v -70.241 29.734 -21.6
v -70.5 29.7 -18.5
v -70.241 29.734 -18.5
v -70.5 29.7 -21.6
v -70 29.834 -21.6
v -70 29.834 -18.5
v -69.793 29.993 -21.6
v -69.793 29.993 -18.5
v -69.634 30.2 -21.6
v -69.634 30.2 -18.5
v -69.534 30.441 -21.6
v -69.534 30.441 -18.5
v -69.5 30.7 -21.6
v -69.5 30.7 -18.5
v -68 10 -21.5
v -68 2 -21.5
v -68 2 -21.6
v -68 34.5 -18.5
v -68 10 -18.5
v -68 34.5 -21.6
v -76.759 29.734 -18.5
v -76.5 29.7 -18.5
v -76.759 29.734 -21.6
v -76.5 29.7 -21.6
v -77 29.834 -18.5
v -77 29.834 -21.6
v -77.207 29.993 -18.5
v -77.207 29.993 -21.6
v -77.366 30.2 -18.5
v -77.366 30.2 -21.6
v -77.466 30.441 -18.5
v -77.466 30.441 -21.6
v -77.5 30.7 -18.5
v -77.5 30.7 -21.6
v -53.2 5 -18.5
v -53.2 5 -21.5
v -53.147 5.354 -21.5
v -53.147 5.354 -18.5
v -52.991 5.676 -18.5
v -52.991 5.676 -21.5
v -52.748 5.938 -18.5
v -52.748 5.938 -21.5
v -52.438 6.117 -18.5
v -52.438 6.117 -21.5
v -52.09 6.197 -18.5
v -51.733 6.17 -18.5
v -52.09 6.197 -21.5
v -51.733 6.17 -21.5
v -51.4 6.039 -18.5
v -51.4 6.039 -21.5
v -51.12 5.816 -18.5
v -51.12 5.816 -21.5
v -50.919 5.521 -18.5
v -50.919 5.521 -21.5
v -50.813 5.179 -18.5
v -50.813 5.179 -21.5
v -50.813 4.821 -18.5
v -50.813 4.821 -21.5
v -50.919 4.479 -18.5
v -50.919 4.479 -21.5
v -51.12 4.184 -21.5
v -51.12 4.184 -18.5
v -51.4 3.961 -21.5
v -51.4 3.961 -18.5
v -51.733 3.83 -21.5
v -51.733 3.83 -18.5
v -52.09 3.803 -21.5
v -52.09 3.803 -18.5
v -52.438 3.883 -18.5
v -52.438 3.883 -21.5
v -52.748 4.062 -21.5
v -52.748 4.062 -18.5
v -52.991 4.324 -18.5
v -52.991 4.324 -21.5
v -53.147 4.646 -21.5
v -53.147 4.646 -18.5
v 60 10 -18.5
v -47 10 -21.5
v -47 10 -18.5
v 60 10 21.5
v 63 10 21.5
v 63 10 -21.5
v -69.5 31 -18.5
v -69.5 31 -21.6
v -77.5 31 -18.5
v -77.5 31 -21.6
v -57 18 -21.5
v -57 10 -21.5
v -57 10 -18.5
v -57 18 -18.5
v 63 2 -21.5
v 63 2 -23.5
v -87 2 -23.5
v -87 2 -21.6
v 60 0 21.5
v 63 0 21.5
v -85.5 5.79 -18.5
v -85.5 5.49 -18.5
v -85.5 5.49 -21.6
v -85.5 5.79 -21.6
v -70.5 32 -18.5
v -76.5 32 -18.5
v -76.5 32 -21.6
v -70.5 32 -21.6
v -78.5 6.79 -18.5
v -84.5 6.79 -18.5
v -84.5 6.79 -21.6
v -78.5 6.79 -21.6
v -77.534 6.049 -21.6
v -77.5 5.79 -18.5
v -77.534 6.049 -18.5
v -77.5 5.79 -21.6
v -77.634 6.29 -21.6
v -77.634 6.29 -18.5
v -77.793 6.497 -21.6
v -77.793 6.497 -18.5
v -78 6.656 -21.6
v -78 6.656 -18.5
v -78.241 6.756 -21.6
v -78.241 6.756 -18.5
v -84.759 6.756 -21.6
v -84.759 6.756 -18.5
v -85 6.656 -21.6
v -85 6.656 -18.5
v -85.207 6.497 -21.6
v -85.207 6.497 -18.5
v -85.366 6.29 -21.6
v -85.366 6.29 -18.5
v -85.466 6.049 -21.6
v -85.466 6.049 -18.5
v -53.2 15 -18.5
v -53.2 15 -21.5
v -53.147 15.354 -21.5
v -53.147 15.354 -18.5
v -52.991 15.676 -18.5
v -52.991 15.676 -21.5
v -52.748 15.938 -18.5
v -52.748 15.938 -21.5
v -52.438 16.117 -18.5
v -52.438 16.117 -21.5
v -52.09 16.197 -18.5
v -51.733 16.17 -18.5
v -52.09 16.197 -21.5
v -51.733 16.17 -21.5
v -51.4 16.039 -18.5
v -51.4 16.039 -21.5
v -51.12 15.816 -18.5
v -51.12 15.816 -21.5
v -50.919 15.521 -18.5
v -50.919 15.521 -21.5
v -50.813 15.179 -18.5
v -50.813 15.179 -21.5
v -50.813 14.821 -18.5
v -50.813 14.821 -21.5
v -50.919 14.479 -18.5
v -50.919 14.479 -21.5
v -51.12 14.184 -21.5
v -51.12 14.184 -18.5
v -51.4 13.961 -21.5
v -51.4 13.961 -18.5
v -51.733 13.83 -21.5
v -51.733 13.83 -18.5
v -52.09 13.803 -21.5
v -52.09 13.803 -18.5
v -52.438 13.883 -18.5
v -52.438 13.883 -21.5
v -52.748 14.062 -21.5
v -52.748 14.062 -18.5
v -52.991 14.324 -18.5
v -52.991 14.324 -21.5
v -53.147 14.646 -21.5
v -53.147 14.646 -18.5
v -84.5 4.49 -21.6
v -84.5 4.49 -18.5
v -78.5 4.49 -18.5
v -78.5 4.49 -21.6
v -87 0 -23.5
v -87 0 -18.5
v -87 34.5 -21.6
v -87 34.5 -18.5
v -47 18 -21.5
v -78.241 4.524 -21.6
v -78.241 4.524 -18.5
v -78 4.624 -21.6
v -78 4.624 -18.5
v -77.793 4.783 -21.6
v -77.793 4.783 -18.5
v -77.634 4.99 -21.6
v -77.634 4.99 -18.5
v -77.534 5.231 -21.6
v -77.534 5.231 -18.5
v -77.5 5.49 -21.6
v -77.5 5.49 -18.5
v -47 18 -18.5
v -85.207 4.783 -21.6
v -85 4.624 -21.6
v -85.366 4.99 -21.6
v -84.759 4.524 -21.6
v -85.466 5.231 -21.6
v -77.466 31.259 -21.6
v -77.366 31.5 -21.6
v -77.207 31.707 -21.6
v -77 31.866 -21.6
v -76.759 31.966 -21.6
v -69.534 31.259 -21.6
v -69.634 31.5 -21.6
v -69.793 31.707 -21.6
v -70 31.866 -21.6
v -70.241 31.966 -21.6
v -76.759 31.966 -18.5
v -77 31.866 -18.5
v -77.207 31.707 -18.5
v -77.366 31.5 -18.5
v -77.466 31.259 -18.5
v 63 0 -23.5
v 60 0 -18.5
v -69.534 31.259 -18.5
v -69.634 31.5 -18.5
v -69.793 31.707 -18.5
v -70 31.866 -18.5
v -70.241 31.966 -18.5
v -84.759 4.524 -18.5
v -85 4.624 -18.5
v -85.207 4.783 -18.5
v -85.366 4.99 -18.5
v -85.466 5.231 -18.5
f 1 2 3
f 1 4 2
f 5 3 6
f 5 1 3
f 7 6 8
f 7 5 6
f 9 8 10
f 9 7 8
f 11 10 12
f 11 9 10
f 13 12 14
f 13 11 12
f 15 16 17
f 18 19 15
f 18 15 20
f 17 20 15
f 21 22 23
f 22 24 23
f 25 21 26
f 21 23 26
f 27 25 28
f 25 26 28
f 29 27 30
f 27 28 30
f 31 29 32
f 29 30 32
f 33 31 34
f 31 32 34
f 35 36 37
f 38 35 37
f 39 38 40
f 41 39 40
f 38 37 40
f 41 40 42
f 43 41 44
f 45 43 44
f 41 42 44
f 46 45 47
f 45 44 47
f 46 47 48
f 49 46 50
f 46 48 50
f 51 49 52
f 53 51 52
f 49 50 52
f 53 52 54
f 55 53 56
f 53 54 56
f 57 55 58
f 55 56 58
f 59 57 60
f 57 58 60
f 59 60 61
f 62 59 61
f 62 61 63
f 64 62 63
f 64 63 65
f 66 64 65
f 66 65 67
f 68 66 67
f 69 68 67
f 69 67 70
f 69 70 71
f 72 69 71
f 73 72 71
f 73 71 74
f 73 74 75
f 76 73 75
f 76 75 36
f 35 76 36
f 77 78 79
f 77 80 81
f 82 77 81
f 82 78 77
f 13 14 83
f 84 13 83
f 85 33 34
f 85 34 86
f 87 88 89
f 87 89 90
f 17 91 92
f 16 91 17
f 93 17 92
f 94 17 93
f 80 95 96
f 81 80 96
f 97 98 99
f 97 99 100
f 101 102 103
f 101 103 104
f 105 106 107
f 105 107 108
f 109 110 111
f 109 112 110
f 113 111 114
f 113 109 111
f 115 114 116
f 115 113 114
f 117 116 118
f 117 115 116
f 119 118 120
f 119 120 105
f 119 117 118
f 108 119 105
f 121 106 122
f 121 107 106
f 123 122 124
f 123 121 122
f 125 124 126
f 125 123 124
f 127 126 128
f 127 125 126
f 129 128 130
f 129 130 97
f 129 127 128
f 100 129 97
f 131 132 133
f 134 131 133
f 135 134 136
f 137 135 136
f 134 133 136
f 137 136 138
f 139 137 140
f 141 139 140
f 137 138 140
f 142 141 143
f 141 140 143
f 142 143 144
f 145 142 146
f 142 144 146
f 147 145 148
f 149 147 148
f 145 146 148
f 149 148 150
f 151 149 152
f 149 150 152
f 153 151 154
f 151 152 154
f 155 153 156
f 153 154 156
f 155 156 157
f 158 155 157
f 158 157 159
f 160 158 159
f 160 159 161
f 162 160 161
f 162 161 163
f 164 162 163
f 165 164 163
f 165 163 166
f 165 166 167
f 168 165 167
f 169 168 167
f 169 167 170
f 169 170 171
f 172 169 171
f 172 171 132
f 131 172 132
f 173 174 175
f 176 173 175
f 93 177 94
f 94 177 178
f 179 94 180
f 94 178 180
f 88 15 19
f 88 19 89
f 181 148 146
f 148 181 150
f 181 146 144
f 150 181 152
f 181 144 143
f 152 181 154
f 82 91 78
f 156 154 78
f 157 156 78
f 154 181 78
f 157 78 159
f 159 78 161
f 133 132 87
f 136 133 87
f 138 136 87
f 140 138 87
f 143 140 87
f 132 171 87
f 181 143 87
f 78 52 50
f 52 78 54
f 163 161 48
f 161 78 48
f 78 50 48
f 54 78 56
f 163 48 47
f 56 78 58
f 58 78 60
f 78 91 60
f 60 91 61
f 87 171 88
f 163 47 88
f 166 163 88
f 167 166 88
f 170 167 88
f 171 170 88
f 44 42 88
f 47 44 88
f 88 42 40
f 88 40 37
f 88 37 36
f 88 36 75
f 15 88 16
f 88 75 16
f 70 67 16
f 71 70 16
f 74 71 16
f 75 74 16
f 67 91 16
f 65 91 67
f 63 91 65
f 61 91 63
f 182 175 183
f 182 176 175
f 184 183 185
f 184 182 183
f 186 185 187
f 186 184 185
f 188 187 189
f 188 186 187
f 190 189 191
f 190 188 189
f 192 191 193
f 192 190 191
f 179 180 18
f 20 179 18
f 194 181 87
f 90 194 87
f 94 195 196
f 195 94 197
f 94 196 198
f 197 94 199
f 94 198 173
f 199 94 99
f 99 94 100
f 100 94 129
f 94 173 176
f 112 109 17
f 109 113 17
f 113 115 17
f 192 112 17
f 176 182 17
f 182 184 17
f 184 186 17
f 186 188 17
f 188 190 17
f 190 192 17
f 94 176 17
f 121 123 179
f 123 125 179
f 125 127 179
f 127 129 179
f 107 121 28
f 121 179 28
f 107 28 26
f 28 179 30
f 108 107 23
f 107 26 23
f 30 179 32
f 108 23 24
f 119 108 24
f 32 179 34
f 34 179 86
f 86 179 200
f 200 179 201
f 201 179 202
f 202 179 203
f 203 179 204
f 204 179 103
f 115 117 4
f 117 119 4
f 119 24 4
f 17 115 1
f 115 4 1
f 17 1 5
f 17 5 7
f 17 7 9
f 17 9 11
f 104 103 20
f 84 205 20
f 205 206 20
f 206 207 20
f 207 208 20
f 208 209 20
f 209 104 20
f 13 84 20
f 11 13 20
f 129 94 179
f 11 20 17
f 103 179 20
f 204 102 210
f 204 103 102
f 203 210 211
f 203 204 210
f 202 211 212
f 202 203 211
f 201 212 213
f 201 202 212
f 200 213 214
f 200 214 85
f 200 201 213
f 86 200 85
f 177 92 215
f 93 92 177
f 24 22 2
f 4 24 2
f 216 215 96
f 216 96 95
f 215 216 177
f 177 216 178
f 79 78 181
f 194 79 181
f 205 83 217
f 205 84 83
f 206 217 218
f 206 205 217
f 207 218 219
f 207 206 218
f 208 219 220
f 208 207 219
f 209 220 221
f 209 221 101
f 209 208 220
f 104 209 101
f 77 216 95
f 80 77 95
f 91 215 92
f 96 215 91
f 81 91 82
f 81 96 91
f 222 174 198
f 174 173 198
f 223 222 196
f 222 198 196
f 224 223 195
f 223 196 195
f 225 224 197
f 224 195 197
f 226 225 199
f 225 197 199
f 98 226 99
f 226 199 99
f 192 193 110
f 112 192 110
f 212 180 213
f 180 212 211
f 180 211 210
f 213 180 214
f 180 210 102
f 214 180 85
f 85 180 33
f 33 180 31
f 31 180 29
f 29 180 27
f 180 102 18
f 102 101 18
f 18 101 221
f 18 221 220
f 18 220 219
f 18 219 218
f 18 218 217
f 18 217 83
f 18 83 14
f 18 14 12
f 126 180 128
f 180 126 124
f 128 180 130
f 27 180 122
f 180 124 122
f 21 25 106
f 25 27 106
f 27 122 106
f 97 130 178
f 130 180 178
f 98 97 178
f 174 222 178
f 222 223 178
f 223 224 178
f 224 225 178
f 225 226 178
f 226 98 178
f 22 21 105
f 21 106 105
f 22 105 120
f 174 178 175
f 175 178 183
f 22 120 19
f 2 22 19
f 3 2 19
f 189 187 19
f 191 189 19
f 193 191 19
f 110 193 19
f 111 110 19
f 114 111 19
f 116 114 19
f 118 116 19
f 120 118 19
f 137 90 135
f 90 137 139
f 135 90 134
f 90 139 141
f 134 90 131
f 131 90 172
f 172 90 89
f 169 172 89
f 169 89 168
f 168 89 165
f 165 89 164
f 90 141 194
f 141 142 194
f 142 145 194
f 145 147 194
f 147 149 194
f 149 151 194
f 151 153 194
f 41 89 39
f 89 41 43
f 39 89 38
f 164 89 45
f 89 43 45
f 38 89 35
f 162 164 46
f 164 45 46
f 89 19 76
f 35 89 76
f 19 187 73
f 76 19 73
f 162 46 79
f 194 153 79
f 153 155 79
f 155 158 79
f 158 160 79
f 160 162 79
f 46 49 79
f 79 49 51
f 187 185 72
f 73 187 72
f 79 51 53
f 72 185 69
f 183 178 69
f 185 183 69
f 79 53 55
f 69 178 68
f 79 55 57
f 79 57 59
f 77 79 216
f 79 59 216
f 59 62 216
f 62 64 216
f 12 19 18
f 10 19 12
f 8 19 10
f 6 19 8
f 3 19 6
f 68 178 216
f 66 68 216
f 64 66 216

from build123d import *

# Parameters (mm, degrees)
EXTRUDE_1_DEPTH     = 10
SKETCH_2_W          = 10
SKETCH_2_H          = 18
EXTRUDE_2_DEPTH     = 3
SKETCH_3_R          = 1.2
CUT_EXTRUDE_1_DEPTH = 99.701570403
SKETCH_4_W          = 150
SKETCH_4_H          = 2
EXTRUDE_3_DEPTH     = 2
SKETCH_5_W          = 19
SKETCH_5_H          = 34.5
EXTRUDE_4_DEPTH     = 3.1
SKETCH_7_W          = 8
SKETCH_7_H          = 2.3
CUT_EXTRUDE_2_DEPTH = 10
FILLET_1_R          = 1


with BuildPart() as part:
    # Эскиз1 → Бобышка-Вытянуть1 (new body)
    with BuildSketch(Plane(origin=(0, 0, 0), x_dir=(1, 0, 0), z_dir=(0, 1, 0))):
        Polygon((-87, 21.5), (-87, 18.5), (-60, 18.5), (60, 18.5), (60, -21.5), (63, -21.5), (63, 21.5), align=None)
    extrude(amount=EXTRUDE_1_DEPTH)

    # Эскиз2 → Бобышка-Вытянуть2 (add)
    with BuildSketch(Plane(origin=(0, 0, -21.5), x_dir=(-1, 0, 0), z_dir=(0, 0, -1))):
        with Locations((52, 9)):
            Rectangle(SKETCH_2_W, SKETCH_2_H)
    extrude(amount=-EXTRUDE_2_DEPTH)

    # Эскиз3 → Вырез-Вытянуть1 (cut, through all)
    with BuildSketch(Plane(origin=(0, 0, -21.5), x_dir=(-1, 0, 0), z_dir=(0, 0, -1))):
        with Locations((52, 15)):
            Circle(SKETCH_3_R)
        with Locations((52, 5)):
            Circle(SKETCH_3_R)
    extrude(amount=-CUT_EXTRUDE_1_DEPTH, mode=Mode.SUBTRACT)

    # Эскиз4 → Бобышка-Вытянуть3 (add)
    with BuildSketch(Plane(origin=(0, 0, -21.5), x_dir=(-1, 0, 0), z_dir=(0, 0, -1))):
        with Locations((12, 1)):
            Rectangle(SKETCH_4_W, SKETCH_4_H)
    extrude(amount=EXTRUDE_3_DEPTH)

    # Эскиз5 → Бобышка-Вытянуть4 (add)
    with BuildSketch(Plane.XY.offset(-18.5)):
        with Locations((-77.5, 17.25)):
            Rectangle(SKETCH_5_W, SKETCH_5_H)
    extrude(amount=-EXTRUDE_4_DEPTH)

    # Эскиз7 → Вырез-Вытянуть2 (cut)
    with BuildSketch(Plane.XY.offset(-18.5)):
        with Locations((-73.5, 30.850007469)):
            Rectangle(SKETCH_7_W, SKETCH_7_H)
        with Locations((-81.5, 5.639796257)):
            Rectangle(SKETCH_7_W, SKETCH_7_H)
    extrude(amount=-CUT_EXTRUDE_2_DEPTH, mode=Mode.SUBTRACT)

    # Скругление1
    fillet_1_edges = [part.edges().sort_by_distance(p)[0] for p in [
        (-85.5, 4.489796257, -20.05),
        (-85.5, 6.789796257, -20.05),
        (-77.5, 6.789796257, -20.05),
        (-77.5, 4.489796257, -20.05),
        (-69.5, 32.000007469, -20.05),
        (-69.5, 29.700007469, -20.05),
        (-77.5, 29.700007469, -20.05),
        (-77.5, 32.000007469, -20.05),
    ]]
    fillet(fillet_1_edges, radius=FILLET_1_R)


solid = part.part
